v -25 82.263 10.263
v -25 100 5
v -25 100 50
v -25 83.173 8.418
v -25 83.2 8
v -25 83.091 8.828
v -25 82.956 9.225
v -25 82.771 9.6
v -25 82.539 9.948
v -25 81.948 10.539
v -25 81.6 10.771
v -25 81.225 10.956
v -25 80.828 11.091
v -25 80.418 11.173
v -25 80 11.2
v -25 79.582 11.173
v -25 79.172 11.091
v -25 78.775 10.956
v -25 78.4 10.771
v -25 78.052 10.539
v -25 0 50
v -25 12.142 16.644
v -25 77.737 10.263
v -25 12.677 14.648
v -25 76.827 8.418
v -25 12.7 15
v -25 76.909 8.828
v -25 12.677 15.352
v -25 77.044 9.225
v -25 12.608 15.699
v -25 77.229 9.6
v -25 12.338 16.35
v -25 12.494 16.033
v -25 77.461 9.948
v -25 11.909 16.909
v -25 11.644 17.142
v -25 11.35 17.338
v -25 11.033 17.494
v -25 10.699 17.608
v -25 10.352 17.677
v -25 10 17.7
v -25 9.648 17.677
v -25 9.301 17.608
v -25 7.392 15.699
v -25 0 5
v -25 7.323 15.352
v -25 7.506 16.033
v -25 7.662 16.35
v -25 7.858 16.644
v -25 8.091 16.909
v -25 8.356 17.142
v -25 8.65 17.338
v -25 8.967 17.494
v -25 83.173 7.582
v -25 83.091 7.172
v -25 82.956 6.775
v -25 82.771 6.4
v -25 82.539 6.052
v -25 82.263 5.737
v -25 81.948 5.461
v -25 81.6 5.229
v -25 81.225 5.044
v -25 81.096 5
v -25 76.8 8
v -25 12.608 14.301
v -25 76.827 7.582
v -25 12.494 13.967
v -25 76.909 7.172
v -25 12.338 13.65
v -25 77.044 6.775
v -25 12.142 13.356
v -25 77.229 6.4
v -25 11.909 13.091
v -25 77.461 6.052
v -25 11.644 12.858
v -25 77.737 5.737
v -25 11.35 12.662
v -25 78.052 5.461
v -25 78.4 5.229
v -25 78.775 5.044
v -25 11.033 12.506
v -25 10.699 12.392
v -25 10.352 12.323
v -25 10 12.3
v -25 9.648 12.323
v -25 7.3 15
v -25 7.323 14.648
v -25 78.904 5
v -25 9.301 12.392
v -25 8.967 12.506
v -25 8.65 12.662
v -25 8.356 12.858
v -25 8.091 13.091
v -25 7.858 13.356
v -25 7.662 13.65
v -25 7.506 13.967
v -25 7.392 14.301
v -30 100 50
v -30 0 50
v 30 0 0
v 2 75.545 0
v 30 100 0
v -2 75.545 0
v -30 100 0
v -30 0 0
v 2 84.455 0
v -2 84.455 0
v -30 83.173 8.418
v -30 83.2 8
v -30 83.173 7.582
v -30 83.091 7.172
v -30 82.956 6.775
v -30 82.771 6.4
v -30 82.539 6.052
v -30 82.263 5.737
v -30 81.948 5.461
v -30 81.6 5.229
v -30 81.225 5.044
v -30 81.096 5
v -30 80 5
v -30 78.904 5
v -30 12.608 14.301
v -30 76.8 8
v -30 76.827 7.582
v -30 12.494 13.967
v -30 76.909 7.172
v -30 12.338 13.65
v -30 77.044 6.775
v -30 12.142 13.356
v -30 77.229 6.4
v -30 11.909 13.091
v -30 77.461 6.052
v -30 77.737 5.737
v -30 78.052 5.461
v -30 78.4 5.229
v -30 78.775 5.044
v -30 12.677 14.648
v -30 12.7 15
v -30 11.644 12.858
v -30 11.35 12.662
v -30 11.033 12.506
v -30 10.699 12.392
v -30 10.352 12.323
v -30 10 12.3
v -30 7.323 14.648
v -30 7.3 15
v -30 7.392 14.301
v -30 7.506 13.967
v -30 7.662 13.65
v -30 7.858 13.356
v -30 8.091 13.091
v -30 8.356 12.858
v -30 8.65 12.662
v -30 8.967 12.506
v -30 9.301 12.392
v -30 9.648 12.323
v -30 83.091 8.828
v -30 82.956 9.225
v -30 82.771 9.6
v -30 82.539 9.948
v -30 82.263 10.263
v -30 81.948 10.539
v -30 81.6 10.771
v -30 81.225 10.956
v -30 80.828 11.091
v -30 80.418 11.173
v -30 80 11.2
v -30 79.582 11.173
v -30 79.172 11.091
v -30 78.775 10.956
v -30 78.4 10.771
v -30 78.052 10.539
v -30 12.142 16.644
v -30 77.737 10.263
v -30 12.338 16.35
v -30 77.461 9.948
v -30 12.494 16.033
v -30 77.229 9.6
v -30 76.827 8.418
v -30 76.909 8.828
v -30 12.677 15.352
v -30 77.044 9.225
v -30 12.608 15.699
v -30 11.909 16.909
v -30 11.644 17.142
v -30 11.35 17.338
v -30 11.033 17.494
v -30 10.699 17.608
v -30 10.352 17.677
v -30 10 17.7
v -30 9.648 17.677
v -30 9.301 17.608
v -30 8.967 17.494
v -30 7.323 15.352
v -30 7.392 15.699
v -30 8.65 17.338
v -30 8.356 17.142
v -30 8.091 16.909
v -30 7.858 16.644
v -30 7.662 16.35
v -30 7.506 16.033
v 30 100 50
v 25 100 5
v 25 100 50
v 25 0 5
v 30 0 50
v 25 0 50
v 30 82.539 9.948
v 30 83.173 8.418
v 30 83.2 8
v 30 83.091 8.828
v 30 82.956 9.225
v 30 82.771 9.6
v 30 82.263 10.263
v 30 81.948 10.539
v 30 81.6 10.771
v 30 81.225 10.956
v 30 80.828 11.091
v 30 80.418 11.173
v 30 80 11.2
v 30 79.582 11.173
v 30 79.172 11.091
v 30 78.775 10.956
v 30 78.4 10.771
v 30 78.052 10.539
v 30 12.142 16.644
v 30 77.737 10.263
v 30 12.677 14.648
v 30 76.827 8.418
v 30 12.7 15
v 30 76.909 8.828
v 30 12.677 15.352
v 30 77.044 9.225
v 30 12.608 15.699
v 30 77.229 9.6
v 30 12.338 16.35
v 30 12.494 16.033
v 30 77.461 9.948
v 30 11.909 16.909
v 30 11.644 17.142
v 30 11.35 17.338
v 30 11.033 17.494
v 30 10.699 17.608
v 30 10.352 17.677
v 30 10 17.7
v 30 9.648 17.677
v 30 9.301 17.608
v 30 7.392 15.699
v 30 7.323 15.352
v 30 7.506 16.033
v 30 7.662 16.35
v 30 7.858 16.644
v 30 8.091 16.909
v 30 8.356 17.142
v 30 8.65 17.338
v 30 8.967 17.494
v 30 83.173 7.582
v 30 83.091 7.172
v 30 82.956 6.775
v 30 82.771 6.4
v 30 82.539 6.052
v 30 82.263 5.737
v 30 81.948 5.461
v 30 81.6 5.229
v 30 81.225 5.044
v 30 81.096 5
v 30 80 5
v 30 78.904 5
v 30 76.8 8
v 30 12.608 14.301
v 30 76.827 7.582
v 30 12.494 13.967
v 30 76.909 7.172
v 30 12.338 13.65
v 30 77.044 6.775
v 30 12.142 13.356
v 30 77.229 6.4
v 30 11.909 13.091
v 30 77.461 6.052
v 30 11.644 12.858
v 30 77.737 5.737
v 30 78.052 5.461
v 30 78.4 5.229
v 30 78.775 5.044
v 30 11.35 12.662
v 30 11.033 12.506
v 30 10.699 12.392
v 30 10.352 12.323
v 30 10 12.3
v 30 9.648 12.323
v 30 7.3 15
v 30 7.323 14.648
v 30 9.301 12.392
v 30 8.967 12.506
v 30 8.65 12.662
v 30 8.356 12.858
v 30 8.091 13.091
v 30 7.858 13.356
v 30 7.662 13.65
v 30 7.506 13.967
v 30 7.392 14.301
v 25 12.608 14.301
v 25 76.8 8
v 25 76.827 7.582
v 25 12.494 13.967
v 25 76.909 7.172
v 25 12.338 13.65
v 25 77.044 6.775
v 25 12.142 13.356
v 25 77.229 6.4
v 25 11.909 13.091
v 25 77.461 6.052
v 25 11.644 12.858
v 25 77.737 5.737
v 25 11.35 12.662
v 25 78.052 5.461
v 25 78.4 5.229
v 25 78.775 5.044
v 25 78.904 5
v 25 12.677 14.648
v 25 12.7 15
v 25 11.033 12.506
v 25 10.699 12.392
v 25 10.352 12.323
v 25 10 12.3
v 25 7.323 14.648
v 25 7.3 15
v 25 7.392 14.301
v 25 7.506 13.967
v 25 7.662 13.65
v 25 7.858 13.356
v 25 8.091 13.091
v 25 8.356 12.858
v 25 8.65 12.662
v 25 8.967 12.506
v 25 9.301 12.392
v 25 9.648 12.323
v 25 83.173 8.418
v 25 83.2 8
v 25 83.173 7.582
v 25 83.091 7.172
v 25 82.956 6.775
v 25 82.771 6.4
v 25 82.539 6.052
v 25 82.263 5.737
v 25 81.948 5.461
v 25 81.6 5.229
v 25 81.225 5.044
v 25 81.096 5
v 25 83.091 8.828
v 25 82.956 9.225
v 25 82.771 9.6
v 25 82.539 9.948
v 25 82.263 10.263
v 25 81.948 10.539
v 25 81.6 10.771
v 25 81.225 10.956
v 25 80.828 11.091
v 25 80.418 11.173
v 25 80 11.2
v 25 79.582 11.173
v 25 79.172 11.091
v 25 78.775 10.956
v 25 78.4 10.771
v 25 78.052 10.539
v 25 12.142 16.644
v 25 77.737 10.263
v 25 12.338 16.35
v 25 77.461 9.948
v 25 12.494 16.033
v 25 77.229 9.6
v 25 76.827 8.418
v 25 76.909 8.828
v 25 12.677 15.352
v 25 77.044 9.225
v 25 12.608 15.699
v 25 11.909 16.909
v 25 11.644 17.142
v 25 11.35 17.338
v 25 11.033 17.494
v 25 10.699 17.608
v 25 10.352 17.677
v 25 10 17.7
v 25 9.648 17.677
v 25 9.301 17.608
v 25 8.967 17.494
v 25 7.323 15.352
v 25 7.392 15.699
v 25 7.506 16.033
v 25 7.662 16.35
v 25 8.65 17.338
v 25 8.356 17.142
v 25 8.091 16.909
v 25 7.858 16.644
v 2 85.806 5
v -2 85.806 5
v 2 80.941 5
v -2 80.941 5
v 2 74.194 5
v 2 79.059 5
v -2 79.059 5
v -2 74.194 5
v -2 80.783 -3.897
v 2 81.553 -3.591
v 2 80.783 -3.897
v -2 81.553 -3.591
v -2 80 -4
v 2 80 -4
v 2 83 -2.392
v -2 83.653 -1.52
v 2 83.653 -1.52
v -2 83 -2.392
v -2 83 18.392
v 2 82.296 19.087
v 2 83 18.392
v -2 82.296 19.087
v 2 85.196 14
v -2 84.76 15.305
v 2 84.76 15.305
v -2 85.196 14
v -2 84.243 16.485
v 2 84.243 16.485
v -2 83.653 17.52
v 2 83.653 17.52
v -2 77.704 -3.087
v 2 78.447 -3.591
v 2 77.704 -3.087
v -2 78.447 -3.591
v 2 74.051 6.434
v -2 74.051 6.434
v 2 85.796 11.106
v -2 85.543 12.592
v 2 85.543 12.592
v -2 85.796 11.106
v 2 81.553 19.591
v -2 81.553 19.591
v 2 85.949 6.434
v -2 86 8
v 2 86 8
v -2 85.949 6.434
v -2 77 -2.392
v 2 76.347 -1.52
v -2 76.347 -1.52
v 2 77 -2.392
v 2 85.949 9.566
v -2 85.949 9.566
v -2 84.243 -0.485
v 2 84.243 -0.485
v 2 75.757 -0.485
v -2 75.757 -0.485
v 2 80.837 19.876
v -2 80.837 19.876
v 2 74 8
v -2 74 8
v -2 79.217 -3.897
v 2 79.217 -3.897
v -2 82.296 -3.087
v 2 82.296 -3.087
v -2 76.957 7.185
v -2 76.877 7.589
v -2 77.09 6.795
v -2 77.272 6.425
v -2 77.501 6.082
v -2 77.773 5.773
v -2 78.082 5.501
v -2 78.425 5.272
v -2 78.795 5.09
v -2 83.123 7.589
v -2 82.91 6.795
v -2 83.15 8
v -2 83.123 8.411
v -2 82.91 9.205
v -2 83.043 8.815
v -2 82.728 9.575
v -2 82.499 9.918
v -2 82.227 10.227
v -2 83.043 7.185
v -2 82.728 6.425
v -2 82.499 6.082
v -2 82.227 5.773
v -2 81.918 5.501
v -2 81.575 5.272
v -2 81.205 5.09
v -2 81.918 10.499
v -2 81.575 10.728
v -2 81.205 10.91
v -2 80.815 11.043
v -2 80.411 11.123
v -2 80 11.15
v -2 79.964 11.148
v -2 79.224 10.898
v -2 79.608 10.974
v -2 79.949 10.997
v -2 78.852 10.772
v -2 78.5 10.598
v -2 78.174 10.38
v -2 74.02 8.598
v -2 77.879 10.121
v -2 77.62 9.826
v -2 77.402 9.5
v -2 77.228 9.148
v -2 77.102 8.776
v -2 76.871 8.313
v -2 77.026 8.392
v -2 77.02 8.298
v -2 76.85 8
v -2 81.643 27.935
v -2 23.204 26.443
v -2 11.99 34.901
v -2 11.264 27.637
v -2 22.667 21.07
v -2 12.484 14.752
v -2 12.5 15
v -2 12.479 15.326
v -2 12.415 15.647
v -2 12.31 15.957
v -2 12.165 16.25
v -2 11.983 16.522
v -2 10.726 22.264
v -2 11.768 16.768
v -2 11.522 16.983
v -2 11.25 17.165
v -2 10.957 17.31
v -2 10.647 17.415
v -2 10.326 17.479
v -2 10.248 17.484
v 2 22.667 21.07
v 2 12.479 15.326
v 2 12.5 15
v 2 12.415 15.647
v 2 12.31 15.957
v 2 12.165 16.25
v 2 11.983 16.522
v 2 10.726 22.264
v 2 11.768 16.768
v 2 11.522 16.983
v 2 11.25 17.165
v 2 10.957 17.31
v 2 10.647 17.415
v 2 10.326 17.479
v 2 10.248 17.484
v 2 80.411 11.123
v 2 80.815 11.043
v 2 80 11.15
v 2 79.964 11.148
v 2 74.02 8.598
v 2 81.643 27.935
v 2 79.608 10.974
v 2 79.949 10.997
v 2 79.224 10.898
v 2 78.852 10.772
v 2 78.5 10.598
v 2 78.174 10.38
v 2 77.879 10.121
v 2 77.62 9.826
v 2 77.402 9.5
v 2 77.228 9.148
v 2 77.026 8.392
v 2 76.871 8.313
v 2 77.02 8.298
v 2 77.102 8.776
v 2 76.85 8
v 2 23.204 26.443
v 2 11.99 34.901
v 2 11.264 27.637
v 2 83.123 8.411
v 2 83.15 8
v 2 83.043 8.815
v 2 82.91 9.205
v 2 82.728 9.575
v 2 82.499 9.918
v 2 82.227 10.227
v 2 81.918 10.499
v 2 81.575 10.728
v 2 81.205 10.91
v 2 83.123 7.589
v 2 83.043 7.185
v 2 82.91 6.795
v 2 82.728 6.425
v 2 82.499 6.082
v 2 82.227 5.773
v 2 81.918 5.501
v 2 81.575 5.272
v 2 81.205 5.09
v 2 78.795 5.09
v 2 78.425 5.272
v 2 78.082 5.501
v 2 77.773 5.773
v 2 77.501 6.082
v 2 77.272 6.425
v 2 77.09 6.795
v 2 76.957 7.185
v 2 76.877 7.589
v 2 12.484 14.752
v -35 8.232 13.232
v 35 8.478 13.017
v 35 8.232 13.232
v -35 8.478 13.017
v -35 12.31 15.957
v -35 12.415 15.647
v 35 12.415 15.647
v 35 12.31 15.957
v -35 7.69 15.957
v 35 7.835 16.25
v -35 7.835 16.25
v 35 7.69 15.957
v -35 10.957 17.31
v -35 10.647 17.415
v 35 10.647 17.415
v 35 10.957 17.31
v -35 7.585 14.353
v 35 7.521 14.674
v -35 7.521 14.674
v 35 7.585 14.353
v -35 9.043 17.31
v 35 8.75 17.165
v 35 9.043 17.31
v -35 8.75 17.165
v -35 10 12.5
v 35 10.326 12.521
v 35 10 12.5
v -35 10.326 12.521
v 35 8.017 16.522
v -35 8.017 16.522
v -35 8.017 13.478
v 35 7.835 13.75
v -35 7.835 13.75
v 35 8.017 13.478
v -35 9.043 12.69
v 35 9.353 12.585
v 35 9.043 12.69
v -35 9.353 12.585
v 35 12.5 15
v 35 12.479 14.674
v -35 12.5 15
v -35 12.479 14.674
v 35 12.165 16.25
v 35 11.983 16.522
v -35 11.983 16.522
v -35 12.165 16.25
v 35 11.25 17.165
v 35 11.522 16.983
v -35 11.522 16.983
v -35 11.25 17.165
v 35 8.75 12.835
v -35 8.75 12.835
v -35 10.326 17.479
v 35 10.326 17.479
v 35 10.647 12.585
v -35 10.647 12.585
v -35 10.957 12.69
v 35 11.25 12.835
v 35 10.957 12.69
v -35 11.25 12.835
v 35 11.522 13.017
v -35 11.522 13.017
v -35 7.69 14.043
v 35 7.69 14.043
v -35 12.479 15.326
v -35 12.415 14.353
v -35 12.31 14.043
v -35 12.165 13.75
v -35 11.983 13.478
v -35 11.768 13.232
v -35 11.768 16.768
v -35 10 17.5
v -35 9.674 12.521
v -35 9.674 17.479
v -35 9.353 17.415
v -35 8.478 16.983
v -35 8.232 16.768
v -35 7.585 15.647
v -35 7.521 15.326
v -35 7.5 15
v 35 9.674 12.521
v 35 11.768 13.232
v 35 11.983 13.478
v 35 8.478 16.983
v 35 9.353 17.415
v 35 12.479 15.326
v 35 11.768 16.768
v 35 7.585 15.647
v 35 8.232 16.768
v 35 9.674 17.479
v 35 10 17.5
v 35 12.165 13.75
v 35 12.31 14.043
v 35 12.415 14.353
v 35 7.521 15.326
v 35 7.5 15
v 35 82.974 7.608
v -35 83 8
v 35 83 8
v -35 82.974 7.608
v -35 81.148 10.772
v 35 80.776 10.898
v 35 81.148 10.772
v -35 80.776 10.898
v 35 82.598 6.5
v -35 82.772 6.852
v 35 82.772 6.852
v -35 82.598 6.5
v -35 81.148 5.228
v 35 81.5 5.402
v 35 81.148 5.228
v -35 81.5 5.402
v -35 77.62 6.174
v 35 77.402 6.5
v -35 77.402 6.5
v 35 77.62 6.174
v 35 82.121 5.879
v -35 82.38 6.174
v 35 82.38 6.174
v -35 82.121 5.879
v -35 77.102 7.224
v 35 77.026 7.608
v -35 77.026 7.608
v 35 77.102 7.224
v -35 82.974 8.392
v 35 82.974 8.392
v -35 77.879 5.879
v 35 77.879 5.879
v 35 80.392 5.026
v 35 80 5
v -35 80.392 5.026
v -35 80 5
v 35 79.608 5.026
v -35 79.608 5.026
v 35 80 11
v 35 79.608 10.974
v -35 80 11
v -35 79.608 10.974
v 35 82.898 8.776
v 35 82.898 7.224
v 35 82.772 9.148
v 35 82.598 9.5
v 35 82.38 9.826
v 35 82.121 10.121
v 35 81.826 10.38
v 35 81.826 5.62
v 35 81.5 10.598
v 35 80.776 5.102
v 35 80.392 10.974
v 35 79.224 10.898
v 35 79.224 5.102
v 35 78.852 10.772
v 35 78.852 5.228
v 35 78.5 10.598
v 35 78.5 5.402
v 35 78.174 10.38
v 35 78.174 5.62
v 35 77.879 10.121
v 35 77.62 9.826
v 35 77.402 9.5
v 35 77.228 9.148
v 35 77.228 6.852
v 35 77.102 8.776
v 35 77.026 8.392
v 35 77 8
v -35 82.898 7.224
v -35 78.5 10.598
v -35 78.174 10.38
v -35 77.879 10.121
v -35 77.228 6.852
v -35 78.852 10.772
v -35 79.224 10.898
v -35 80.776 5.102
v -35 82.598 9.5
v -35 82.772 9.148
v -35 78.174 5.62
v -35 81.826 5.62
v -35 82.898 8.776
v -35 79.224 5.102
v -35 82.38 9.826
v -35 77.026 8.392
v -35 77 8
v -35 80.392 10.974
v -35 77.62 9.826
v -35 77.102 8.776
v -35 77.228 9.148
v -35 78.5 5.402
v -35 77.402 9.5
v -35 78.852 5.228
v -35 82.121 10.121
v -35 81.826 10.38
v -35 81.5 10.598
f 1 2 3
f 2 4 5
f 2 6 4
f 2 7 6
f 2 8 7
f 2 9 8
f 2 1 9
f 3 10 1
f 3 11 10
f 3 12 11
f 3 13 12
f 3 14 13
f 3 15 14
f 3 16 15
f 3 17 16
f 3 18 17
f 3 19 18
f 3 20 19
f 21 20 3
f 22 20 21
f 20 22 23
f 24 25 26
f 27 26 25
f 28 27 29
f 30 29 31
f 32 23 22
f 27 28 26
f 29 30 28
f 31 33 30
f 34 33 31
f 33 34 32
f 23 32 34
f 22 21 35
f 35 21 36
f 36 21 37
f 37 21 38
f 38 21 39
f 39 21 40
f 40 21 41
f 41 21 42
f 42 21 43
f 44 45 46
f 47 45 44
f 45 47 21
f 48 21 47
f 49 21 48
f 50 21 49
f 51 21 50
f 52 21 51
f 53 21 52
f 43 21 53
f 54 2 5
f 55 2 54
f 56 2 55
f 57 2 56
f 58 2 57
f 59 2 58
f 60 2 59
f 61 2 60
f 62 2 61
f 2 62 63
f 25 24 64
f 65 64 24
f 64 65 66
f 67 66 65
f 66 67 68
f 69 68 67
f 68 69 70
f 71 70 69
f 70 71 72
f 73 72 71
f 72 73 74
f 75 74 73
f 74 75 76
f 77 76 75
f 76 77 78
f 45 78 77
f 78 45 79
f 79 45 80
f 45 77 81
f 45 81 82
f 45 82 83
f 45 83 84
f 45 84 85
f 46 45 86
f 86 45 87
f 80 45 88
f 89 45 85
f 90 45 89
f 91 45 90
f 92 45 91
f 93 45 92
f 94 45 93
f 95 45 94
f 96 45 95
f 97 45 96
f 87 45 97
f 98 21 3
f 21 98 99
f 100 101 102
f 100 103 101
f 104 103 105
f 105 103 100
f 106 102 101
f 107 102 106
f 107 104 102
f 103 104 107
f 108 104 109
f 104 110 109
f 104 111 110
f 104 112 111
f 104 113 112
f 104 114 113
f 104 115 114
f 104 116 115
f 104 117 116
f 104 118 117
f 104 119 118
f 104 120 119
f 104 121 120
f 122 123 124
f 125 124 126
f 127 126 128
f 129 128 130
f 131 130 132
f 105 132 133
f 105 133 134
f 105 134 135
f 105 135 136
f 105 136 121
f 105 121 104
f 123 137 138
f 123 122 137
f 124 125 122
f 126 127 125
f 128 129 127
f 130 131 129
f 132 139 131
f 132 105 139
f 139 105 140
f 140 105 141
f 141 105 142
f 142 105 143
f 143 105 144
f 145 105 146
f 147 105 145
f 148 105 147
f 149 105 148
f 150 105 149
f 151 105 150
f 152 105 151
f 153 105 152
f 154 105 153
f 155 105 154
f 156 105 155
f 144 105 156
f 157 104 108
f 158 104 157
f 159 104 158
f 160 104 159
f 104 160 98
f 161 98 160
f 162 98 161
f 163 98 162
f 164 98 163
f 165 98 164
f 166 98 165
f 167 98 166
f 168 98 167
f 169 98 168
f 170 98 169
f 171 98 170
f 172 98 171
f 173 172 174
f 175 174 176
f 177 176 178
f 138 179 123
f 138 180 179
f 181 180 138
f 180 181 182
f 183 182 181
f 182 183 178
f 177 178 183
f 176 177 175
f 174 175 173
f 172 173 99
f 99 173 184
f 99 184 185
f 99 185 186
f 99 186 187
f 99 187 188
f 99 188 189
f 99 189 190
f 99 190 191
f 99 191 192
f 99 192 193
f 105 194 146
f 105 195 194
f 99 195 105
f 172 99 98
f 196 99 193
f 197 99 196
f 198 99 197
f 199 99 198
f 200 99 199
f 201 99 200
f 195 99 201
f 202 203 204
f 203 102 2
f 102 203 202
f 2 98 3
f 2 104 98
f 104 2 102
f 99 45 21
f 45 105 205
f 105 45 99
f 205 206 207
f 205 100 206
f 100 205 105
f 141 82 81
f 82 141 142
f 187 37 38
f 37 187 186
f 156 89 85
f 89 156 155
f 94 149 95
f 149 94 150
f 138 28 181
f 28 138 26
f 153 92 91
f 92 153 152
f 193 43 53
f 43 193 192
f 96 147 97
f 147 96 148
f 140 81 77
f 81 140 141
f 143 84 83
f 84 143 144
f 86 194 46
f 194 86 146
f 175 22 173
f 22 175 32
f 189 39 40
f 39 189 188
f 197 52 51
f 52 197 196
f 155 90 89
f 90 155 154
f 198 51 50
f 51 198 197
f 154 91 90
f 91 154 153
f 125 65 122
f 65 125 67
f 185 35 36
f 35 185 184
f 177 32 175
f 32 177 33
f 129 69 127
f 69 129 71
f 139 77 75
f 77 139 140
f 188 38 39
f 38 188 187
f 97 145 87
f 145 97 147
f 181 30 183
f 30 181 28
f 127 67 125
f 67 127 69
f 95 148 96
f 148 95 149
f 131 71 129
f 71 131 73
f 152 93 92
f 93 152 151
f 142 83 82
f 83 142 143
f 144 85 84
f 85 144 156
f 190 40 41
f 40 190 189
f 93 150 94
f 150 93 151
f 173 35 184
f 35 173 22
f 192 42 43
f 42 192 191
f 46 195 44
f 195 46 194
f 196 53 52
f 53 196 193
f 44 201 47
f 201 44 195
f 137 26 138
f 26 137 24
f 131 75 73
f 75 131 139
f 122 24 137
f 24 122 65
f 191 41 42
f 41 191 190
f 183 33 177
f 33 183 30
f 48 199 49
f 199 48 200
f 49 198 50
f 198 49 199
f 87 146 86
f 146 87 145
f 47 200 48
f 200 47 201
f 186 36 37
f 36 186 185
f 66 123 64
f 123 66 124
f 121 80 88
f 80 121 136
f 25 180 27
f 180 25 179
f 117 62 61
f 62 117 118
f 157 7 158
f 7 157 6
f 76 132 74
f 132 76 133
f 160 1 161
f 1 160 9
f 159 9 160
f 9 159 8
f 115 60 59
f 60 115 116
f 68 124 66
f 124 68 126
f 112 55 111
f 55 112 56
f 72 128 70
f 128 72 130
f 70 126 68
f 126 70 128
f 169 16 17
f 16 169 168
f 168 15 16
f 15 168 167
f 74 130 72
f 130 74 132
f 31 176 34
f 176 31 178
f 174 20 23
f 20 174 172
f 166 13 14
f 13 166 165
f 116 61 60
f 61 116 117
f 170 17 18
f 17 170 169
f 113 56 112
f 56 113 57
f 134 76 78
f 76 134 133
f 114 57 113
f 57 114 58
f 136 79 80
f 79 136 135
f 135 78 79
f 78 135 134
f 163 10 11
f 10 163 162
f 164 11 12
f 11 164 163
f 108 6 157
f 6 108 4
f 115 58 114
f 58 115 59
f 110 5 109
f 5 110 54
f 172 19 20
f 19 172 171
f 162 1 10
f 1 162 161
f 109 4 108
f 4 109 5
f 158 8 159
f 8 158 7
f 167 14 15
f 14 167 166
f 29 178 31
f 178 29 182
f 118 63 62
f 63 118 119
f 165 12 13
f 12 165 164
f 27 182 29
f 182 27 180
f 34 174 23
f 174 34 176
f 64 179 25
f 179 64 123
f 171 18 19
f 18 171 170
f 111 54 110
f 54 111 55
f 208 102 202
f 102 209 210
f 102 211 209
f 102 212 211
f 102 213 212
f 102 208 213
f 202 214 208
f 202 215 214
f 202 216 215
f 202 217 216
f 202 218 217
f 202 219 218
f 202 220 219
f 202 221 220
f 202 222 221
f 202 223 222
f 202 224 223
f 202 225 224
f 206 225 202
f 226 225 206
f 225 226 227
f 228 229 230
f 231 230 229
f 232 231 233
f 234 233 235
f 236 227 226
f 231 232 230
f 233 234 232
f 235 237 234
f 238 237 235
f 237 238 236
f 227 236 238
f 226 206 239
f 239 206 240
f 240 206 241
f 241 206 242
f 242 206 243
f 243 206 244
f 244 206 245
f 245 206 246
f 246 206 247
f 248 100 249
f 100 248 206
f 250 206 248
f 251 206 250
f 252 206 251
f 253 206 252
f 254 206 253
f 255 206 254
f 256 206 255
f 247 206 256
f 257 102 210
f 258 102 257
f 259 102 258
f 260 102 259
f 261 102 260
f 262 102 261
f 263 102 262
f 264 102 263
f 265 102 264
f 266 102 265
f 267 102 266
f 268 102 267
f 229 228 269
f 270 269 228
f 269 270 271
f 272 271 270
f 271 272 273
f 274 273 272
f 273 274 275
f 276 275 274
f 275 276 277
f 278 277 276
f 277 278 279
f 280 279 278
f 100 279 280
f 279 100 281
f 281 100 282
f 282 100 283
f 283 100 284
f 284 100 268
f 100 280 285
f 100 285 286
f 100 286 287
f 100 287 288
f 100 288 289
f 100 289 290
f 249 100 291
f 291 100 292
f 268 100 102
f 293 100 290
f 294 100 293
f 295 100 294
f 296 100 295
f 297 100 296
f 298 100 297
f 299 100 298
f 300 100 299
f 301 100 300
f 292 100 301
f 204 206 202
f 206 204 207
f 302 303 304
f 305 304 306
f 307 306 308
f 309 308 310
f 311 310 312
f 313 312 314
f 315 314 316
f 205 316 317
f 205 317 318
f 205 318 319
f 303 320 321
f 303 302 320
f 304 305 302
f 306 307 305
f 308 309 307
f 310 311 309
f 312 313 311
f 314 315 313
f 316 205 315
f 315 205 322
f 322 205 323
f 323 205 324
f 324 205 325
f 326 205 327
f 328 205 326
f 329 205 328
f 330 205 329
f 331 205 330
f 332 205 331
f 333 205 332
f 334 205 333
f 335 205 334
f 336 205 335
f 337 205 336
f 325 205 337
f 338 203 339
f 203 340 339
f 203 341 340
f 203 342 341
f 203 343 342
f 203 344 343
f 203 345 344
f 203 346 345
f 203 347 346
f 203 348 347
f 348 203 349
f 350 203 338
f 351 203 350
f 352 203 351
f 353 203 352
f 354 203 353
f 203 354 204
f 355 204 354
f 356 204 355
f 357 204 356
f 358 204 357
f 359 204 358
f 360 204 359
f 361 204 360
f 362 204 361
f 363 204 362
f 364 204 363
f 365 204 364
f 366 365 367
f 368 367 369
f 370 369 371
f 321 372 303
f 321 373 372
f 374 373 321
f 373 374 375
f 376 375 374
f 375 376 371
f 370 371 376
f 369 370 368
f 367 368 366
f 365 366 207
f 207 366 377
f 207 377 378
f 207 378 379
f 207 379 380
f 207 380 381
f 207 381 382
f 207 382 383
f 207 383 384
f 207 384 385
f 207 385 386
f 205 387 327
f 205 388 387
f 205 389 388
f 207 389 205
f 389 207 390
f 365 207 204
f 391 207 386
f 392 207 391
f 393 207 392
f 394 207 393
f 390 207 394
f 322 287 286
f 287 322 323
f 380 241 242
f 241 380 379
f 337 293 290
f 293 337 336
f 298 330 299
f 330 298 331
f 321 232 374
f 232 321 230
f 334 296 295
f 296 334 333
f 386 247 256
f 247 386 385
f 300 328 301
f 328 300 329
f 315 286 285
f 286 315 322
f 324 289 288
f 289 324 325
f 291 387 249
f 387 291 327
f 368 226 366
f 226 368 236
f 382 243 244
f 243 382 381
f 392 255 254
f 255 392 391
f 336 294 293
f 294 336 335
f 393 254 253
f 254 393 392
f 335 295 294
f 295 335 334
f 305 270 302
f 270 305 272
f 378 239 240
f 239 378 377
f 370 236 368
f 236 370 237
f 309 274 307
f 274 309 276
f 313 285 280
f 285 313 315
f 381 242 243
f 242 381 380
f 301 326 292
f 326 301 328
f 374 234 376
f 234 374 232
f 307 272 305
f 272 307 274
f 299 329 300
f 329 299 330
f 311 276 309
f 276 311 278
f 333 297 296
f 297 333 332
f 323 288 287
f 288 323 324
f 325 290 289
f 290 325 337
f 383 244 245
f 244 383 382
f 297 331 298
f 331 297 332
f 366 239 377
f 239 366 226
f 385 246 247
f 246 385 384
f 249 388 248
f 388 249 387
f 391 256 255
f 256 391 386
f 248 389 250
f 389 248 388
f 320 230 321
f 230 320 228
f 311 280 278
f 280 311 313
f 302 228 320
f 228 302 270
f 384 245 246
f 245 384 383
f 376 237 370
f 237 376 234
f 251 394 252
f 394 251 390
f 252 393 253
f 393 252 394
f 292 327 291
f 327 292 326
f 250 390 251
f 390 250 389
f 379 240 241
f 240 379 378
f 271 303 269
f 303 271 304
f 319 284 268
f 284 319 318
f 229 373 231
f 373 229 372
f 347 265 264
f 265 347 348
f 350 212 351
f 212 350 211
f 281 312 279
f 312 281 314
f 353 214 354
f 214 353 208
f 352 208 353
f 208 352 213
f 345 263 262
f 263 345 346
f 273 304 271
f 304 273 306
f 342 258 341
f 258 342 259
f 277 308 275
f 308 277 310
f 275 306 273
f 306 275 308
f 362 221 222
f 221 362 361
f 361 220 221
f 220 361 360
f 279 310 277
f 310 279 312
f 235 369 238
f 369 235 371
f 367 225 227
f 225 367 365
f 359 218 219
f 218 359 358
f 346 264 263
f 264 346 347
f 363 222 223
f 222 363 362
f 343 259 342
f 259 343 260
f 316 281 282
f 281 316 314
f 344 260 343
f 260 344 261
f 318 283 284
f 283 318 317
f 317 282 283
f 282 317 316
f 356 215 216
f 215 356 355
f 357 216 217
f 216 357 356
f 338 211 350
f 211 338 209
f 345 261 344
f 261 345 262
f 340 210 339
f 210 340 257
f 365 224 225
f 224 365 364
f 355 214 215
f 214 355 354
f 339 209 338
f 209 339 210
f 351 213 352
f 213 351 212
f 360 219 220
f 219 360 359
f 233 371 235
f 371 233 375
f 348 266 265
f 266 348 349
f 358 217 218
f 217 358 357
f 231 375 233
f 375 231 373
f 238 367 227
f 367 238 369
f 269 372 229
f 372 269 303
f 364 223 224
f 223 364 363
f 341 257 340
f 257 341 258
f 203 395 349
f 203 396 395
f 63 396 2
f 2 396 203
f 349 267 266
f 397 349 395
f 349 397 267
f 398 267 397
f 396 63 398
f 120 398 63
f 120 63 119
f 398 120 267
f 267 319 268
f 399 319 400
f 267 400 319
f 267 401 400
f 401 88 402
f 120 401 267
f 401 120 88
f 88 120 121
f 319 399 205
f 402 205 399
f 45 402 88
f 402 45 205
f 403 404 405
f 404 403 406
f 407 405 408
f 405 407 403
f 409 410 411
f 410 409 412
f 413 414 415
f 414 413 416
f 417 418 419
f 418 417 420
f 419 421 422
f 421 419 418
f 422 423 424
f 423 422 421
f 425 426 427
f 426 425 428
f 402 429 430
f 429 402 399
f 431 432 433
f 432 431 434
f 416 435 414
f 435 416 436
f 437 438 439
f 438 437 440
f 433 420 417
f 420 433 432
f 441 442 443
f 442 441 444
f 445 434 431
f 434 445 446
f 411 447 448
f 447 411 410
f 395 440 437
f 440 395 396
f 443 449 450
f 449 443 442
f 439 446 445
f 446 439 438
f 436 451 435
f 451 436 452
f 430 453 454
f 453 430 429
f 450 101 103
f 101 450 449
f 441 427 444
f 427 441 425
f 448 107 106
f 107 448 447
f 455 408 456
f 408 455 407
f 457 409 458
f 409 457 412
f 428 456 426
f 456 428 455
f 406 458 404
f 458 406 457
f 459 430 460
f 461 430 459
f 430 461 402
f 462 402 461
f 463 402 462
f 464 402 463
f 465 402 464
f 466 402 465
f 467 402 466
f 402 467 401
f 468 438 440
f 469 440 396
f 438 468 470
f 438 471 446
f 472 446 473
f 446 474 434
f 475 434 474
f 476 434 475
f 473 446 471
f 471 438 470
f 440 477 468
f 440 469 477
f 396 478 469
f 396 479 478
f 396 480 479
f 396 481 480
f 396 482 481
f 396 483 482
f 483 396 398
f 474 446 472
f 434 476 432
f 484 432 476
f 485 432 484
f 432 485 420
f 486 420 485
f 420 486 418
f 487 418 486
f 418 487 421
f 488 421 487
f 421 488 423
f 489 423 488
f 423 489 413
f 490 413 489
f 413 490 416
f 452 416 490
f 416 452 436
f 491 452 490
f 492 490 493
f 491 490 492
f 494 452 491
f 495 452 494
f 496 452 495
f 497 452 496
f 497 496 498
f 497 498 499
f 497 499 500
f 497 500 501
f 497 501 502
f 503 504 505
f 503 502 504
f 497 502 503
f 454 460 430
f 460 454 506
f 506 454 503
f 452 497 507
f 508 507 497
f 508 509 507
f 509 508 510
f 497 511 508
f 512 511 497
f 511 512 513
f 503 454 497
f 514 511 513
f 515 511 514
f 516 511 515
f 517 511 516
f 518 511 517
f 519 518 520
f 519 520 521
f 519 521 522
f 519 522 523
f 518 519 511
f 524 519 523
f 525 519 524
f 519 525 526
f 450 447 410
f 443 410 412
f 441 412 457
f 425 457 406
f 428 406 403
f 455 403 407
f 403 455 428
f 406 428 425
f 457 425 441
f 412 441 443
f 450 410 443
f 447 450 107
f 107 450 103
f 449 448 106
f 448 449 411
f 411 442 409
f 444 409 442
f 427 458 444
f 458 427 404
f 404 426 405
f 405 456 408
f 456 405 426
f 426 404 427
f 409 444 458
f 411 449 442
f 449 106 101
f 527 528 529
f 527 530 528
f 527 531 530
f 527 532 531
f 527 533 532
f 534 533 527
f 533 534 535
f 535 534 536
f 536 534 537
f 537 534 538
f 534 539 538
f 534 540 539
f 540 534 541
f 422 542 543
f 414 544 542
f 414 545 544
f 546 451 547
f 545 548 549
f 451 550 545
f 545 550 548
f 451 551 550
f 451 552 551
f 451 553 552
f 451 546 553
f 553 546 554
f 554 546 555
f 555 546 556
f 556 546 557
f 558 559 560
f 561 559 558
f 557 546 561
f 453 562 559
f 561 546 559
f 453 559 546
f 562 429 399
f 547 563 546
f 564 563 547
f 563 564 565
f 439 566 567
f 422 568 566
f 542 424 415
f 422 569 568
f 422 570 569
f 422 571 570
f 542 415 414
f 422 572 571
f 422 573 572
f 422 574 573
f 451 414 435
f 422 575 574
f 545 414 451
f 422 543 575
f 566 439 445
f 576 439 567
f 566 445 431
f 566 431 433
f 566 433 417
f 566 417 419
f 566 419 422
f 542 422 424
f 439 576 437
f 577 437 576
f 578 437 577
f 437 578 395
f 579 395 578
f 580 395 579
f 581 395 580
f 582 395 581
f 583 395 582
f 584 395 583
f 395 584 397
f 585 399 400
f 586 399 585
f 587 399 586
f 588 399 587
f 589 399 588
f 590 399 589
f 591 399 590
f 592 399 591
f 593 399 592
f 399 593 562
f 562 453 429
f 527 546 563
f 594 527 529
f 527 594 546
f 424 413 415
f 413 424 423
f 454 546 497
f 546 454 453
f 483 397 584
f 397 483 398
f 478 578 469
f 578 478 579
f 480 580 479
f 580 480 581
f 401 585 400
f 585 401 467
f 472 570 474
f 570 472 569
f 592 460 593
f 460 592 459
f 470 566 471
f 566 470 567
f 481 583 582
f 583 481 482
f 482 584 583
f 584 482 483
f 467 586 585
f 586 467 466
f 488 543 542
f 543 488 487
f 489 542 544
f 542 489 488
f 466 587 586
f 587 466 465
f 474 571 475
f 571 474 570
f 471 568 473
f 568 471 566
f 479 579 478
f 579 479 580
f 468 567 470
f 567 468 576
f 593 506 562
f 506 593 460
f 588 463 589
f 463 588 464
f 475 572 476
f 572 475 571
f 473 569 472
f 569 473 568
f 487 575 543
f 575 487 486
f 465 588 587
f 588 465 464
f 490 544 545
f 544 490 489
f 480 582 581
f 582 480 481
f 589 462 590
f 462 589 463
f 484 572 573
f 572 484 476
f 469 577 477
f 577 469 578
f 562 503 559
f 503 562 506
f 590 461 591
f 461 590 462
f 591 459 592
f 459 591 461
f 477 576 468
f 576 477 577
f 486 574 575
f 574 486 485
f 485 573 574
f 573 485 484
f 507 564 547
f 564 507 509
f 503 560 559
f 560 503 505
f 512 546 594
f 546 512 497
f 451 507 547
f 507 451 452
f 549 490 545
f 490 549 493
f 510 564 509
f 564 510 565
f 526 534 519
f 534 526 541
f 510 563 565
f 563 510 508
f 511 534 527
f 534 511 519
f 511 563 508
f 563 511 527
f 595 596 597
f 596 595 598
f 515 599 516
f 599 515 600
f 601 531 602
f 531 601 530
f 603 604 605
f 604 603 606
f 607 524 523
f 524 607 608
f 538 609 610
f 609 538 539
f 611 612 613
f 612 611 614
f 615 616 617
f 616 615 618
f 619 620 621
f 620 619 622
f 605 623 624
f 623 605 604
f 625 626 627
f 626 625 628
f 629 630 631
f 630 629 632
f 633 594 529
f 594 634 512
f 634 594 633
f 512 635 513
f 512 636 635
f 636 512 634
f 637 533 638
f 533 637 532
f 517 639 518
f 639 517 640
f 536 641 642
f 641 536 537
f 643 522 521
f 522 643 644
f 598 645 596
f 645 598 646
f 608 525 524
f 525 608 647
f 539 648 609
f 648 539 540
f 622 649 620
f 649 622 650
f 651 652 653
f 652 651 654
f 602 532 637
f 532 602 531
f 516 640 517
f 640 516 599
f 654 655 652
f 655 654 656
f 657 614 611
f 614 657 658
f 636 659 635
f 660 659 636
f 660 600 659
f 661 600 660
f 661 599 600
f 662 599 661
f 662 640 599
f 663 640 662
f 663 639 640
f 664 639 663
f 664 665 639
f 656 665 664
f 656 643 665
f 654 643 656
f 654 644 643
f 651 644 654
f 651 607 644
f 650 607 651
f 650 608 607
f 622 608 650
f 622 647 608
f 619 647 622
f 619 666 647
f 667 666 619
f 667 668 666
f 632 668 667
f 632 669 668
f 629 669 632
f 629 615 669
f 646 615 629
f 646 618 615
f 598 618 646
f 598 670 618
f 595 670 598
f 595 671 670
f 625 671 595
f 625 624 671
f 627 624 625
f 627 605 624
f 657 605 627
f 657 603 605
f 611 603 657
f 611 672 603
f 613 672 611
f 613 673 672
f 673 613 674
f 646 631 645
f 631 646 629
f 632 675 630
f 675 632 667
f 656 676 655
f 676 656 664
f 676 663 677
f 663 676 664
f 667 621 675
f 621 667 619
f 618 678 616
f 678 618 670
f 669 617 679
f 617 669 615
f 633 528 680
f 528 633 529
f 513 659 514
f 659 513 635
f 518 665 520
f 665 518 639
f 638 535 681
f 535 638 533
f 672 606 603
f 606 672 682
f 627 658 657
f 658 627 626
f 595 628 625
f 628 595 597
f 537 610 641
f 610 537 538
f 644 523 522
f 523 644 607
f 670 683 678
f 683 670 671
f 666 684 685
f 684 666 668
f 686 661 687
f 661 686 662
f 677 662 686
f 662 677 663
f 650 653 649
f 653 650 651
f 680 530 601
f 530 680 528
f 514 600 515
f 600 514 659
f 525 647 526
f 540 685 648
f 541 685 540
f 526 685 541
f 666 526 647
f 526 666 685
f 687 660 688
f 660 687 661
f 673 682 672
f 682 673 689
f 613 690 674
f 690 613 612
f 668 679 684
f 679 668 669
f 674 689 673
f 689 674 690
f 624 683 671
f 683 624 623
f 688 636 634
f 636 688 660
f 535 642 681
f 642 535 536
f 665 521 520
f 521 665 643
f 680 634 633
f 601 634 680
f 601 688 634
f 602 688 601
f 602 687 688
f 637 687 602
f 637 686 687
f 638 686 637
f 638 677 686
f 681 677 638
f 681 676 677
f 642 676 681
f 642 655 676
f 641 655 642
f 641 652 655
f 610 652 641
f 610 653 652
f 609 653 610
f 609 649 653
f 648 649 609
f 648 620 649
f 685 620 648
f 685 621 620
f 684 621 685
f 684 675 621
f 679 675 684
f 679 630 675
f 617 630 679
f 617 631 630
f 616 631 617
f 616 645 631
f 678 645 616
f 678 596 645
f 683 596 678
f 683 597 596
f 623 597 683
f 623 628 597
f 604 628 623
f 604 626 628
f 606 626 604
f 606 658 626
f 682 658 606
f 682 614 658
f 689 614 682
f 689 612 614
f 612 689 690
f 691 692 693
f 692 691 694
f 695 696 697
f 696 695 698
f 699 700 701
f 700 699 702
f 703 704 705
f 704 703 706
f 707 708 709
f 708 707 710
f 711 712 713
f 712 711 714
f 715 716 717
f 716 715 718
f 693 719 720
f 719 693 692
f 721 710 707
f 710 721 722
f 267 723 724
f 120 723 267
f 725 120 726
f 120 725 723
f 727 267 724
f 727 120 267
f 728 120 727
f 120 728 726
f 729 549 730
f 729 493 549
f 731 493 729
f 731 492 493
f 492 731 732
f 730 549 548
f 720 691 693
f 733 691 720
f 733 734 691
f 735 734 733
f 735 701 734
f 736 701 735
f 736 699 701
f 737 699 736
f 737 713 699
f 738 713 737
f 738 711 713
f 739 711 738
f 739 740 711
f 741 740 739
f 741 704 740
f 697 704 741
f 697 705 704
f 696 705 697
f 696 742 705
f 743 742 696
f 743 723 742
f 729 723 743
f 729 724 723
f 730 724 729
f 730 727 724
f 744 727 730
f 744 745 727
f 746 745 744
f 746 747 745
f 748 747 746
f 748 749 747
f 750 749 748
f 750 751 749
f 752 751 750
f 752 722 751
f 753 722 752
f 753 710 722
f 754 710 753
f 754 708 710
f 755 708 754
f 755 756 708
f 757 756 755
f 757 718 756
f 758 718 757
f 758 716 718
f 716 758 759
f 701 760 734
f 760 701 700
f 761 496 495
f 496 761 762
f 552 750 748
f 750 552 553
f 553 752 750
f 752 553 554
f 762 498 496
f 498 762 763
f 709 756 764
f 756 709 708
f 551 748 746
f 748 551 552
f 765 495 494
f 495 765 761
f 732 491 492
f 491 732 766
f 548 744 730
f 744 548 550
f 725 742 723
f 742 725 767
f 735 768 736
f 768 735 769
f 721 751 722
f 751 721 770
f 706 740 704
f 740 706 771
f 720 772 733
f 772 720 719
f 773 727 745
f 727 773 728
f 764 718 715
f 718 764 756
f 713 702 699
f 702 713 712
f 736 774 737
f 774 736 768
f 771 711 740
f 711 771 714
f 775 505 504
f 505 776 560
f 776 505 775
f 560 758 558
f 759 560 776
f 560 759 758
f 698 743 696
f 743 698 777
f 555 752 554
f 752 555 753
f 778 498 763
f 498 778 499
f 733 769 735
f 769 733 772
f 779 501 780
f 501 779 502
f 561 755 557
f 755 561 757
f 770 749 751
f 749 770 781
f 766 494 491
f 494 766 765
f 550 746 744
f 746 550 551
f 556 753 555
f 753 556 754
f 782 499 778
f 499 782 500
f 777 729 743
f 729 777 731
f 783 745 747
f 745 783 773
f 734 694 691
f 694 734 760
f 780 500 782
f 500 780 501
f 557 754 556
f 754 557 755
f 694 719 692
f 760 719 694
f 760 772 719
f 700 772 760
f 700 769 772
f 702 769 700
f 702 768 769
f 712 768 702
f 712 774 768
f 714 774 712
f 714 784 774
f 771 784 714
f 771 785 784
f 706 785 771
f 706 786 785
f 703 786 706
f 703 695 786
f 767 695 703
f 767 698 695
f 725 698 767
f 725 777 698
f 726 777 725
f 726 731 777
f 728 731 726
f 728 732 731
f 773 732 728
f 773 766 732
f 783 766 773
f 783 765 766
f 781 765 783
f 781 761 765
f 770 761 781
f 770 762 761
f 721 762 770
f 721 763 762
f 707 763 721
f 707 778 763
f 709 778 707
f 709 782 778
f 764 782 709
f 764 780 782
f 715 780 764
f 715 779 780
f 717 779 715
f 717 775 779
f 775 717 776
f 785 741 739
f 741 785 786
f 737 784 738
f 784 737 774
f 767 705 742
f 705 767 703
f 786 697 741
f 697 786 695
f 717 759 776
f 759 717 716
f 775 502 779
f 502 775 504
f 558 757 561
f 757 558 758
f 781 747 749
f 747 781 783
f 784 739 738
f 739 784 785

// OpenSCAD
/*
 * SINGLE WAVE + CAM TEST
 *
 * Tests the fundamental mechanism:
 * - Cam BELOW wave
 * - Wave rests ON TOP of cam
 * - Gravity keeps contact
 *
 * This MUST work before scaling to 22 waves.
 */

// ============================================
// ANIMATION
// ============================================

MANUAL_ANGLE = -1;
theta = (MANUAL_ANGLE >= 0) ? MANUAL_ANGLE : $t * 360;

// ============================================
// SHOW/HIDE
// ============================================

SHOW_FRAME = true;
SHOW_HINGE_AXLE = true;
SHOW_CAMSHAFT = true;
SHOW_CAM = true;
SHOW_WAVE = true;
SHOW_CONTACT_POINT = true;  // Debug: show where wave touches cam

// ============================================
// Z-LAYER LAYOUT (CRITICAL!)
// ============================================

// Base at Z = 0
Z_BASE = 0;
Z_BASE_THICK = 5;

// Hinge axle - waves pivot here
Z_HINGE = 15;

// Camshaft - below wave contact
Z_CAMSHAFT = 8;

// Wave bottom surface at cam contact
// Must be >= Z_CAMSHAFT + cam_major_radius
// Calculated dynamically based on cam angle

// ============================================
// FRAME PARAMETERS
// ============================================

FRAME_WIDTH = 60;    // X
FRAME_DEPTH = 100;   // Y
FRAME_HEIGHT = 50;   // Z
FRAME_WALL = 5;

// ============================================
// HINGE AXLE (waves pivot on this)
// ============================================

HINGE_AXLE_DIA = 5;
HINGE_AXLE_Y = 10;    // Near back of frame

// ============================================
// CAMSHAFT (holds cam)
// ============================================

CAMSHAFT_DIA = 6;
CAMSHAFT_Y = 80;      // Near front of frame

// ============================================
// CAM PARAMETERS
// ============================================

CAM_MAJOR = 12;       // Major radius (vertical motion)
CAM_MINOR = 6;        // Minor radius (horizontal motion)
CAM_THICK = 4;

// ============================================
// WAVE PARAMETERS
// ============================================

WAVE_THICK = 4;
WAVE_HEIGHT = 20;     // Visual height (Z)
WAVE_LENGTH = CAMSHAFT_Y - HINGE_AXLE_Y;  // Y dimension

// Slot at hinge end
SLOT_WIDTH = HINGE_AXLE_DIA + 0.4;
SLOT_LENGTH = 12;

// ============================================
// DERIVED VALUES
// ============================================

// Cam top surface (where wave contacts)
function cam_top_z() = Z_CAMSHAFT + CAM_MAJOR * sin(theta);

// Wave must rest on cam
// Wave pivot is at Z_HINGE
// Wave contact point is at Y = CAMSHAFT_Y
// Wave rotates to match cam height

function wave_contact_z() = cam_top_z();

// Wave angle from pivot
function wave_angle() =
    atan2(wave_contact_z() - Z_HINGE, CAMSHAFT_Y - HINGE_AXLE_Y);

// ============================================
// COLORS
// ============================================

C_FRAME = [0.3, 0.3, 0.3];
C_AXLE = [0.6, 0.6, 0.65];
C_CAM = [0.8, 0.6, 0.3];
C_WAVE = [0.7, 0.55, 0.4];
C_CONTACT = [1, 0, 0];  // Red debug point

$fn = 48;

// ============================================
// MODULES
// ============================================

// Frame base
module frame_base() {
    color(C_FRAME)
        translate([-FRAME_WIDTH/2, 0, Z_BASE])
            cube([FRAME_WIDTH, FRAME_DEPTH, Z_BASE_THICK]);
}

// Frame side walls
module frame_walls() {
    color(C_FRAME) {
        // Left wall
        translate([-FRAME_WIDTH/2, 0, Z_BASE])
            difference() {
                cube([FRAME_WALL, FRAME_DEPTH, FRAME_HEIGHT]);
                // Hinge axle hole
                translate([-1, HINGE_AXLE_Y, Z_HINGE])
                    rotate([0, 90, 0])
                        cylinder(d=HINGE_AXLE_DIA+0.4, h=FRAME_WALL+2);
                // Camshaft hole
                translate([-1, CAMSHAFT_Y, Z_CAMSHAFT])
                    rotate([0, 90, 0])
                        cylinder(d=CAMSHAFT_DIA+0.4, h=FRAME_WALL+2);
            }
        // Right wall
        translate([FRAME_WIDTH/2 - FRAME_WALL, 0, Z_BASE])
            difference() {
                cube([FRAME_WALL, FRAME_DEPTH, FRAME_HEIGHT]);
                // Hinge axle hole
                translate([-1, HINGE_AXLE_Y, Z_HINGE])
                    rotate([0, 90, 0])
                        cylinder(d=HINGE_AXLE_DIA+0.4, h=FRAME_WALL+2);
                // Camshaft hole
                translate([-1, CAMSHAFT_Y, Z_CAMSHAFT])
                    rotate([0, 90, 0])
                        cylinder(d=CAMSHAFT_DIA+0.4, h=FRAME_WALL+2);
            }
    }
}

// Hinge axle (static)
module hinge_axle() {
    color(C_AXLE)
        translate([-FRAME_WIDTH/2 - 5, HINGE_AXLE_Y, Z_HINGE])
            rotate([0, 90, 0])
                cylinder(d=HINGE_AXLE_DIA, h=FRAME_WIDTH + 10);
}

// Camshaft (rotating)
module camshaft() {
    color(C_AXLE)
        translate([-FRAME_WIDTH/2 - 5, CAMSHAFT_Y, Z_CAMSHAFT])
            rotate([0, 90, 0])
                cylinder(d=CAMSHAFT_DIA, h=FRAME_WIDTH + 10);
}

// Elliptical cam (rotates with camshaft)
module cam() {
    color(C_CAM)
        translate([0, CAMSHAFT_Y, Z_CAMSHAFT])
            rotate([0, 90, 0])
                rotate([0, 0, theta])
                    difference() {
                        // Elliptical disc
                        scale([CAM_MAJOR/10, CAM_MINOR/10, 1])
                            cylinder(r=10, h=CAM_THICK, center=true);
                        // Shaft hole
                        cylinder(d=CAMSHAFT_DIA+0.3, h=CAM_THICK+2, center=true);
                    }
}

// Wave slat (pivots on hinge, rests on cam)
module wave() {
    angle = wave_angle();

    color(C_WAVE)
        translate([0, HINGE_AXLE_Y, Z_HINGE])
            rotate([angle, 0, 0])
                translate([-WAVE_THICK/2, 0, 0]) {
                    difference() {
                        // Main body
                        cube([WAVE_THICK, WAVE_LENGTH, WAVE_HEIGHT]);

                        // Slot at hinge end (axle passes through)
                        translate([-1, -1, WAVE_HEIGHT/2 - SLOT_WIDTH/2])
                            cube([WAVE_THICK+2, SLOT_LENGTH+1, SLOT_WIDTH]);
                    }
                }
}

// Debug: contact point visualization
module contact_point() {
    color(C_CONTACT)
        translate([0, CAMSHAFT_Y, cam_top_z()])
            sphere(r=2);
}

// ============================================
// ASSEMBLY
// ============================================

module single_wave_test() {
    if (SHOW_FRAME) {
        frame_base();
        frame_walls();
    }

    if (SHOW_HINGE_AXLE) hinge_axle();
    if (SHOW_CAMSHAFT) camshaft();
    if (SHOW_CAM) cam();
    if (SHOW_WAVE) wave();
    if (SHOW_CONTACT_POINT) contact_point();
}

// ============================================
// RENDER
// ============================================

single_wave_test();

// ============================================
// DEBUG OUTPUT
// ============================================

echo("╔════════════════════════════════════════════╗");
echo("║     SINGLE WAVE + CAM TEST                 ║");
echo("╚════════════════════════════════════════════╝");
echo("");
echo("Z-LAYER LAYOUT:");
echo(str("  Base:      Z = ", Z_BASE, " to ", Z_BASE + Z_BASE_THICK));
echo(str("  Camshaft:  Z = ", Z_CAMSHAFT));
echo(str("  Hinge:     Z = ", Z_HINGE));
echo("");
echo(str("Current cam angle: ", theta, "°"));
echo(str("Cam top surface:   Z = ", cam_top_z(), "mm"));
echo(str("Wave angle:        ", wave_angle(), "°"));
echo("");
echo("VERIFICATION:");
echo(str("  Cam BELOW hinge? ", Z_CAMSHAFT < Z_HINGE ? "YES ✓" : "NO ✗"));
echo(str("  Wave rests on cam? (gravity assists)"));
echo("");
echo("If wave appears to pass through cam: GEOMETRY ERROR");
echo("Wave should visibly rock up/down as cam rotates");
